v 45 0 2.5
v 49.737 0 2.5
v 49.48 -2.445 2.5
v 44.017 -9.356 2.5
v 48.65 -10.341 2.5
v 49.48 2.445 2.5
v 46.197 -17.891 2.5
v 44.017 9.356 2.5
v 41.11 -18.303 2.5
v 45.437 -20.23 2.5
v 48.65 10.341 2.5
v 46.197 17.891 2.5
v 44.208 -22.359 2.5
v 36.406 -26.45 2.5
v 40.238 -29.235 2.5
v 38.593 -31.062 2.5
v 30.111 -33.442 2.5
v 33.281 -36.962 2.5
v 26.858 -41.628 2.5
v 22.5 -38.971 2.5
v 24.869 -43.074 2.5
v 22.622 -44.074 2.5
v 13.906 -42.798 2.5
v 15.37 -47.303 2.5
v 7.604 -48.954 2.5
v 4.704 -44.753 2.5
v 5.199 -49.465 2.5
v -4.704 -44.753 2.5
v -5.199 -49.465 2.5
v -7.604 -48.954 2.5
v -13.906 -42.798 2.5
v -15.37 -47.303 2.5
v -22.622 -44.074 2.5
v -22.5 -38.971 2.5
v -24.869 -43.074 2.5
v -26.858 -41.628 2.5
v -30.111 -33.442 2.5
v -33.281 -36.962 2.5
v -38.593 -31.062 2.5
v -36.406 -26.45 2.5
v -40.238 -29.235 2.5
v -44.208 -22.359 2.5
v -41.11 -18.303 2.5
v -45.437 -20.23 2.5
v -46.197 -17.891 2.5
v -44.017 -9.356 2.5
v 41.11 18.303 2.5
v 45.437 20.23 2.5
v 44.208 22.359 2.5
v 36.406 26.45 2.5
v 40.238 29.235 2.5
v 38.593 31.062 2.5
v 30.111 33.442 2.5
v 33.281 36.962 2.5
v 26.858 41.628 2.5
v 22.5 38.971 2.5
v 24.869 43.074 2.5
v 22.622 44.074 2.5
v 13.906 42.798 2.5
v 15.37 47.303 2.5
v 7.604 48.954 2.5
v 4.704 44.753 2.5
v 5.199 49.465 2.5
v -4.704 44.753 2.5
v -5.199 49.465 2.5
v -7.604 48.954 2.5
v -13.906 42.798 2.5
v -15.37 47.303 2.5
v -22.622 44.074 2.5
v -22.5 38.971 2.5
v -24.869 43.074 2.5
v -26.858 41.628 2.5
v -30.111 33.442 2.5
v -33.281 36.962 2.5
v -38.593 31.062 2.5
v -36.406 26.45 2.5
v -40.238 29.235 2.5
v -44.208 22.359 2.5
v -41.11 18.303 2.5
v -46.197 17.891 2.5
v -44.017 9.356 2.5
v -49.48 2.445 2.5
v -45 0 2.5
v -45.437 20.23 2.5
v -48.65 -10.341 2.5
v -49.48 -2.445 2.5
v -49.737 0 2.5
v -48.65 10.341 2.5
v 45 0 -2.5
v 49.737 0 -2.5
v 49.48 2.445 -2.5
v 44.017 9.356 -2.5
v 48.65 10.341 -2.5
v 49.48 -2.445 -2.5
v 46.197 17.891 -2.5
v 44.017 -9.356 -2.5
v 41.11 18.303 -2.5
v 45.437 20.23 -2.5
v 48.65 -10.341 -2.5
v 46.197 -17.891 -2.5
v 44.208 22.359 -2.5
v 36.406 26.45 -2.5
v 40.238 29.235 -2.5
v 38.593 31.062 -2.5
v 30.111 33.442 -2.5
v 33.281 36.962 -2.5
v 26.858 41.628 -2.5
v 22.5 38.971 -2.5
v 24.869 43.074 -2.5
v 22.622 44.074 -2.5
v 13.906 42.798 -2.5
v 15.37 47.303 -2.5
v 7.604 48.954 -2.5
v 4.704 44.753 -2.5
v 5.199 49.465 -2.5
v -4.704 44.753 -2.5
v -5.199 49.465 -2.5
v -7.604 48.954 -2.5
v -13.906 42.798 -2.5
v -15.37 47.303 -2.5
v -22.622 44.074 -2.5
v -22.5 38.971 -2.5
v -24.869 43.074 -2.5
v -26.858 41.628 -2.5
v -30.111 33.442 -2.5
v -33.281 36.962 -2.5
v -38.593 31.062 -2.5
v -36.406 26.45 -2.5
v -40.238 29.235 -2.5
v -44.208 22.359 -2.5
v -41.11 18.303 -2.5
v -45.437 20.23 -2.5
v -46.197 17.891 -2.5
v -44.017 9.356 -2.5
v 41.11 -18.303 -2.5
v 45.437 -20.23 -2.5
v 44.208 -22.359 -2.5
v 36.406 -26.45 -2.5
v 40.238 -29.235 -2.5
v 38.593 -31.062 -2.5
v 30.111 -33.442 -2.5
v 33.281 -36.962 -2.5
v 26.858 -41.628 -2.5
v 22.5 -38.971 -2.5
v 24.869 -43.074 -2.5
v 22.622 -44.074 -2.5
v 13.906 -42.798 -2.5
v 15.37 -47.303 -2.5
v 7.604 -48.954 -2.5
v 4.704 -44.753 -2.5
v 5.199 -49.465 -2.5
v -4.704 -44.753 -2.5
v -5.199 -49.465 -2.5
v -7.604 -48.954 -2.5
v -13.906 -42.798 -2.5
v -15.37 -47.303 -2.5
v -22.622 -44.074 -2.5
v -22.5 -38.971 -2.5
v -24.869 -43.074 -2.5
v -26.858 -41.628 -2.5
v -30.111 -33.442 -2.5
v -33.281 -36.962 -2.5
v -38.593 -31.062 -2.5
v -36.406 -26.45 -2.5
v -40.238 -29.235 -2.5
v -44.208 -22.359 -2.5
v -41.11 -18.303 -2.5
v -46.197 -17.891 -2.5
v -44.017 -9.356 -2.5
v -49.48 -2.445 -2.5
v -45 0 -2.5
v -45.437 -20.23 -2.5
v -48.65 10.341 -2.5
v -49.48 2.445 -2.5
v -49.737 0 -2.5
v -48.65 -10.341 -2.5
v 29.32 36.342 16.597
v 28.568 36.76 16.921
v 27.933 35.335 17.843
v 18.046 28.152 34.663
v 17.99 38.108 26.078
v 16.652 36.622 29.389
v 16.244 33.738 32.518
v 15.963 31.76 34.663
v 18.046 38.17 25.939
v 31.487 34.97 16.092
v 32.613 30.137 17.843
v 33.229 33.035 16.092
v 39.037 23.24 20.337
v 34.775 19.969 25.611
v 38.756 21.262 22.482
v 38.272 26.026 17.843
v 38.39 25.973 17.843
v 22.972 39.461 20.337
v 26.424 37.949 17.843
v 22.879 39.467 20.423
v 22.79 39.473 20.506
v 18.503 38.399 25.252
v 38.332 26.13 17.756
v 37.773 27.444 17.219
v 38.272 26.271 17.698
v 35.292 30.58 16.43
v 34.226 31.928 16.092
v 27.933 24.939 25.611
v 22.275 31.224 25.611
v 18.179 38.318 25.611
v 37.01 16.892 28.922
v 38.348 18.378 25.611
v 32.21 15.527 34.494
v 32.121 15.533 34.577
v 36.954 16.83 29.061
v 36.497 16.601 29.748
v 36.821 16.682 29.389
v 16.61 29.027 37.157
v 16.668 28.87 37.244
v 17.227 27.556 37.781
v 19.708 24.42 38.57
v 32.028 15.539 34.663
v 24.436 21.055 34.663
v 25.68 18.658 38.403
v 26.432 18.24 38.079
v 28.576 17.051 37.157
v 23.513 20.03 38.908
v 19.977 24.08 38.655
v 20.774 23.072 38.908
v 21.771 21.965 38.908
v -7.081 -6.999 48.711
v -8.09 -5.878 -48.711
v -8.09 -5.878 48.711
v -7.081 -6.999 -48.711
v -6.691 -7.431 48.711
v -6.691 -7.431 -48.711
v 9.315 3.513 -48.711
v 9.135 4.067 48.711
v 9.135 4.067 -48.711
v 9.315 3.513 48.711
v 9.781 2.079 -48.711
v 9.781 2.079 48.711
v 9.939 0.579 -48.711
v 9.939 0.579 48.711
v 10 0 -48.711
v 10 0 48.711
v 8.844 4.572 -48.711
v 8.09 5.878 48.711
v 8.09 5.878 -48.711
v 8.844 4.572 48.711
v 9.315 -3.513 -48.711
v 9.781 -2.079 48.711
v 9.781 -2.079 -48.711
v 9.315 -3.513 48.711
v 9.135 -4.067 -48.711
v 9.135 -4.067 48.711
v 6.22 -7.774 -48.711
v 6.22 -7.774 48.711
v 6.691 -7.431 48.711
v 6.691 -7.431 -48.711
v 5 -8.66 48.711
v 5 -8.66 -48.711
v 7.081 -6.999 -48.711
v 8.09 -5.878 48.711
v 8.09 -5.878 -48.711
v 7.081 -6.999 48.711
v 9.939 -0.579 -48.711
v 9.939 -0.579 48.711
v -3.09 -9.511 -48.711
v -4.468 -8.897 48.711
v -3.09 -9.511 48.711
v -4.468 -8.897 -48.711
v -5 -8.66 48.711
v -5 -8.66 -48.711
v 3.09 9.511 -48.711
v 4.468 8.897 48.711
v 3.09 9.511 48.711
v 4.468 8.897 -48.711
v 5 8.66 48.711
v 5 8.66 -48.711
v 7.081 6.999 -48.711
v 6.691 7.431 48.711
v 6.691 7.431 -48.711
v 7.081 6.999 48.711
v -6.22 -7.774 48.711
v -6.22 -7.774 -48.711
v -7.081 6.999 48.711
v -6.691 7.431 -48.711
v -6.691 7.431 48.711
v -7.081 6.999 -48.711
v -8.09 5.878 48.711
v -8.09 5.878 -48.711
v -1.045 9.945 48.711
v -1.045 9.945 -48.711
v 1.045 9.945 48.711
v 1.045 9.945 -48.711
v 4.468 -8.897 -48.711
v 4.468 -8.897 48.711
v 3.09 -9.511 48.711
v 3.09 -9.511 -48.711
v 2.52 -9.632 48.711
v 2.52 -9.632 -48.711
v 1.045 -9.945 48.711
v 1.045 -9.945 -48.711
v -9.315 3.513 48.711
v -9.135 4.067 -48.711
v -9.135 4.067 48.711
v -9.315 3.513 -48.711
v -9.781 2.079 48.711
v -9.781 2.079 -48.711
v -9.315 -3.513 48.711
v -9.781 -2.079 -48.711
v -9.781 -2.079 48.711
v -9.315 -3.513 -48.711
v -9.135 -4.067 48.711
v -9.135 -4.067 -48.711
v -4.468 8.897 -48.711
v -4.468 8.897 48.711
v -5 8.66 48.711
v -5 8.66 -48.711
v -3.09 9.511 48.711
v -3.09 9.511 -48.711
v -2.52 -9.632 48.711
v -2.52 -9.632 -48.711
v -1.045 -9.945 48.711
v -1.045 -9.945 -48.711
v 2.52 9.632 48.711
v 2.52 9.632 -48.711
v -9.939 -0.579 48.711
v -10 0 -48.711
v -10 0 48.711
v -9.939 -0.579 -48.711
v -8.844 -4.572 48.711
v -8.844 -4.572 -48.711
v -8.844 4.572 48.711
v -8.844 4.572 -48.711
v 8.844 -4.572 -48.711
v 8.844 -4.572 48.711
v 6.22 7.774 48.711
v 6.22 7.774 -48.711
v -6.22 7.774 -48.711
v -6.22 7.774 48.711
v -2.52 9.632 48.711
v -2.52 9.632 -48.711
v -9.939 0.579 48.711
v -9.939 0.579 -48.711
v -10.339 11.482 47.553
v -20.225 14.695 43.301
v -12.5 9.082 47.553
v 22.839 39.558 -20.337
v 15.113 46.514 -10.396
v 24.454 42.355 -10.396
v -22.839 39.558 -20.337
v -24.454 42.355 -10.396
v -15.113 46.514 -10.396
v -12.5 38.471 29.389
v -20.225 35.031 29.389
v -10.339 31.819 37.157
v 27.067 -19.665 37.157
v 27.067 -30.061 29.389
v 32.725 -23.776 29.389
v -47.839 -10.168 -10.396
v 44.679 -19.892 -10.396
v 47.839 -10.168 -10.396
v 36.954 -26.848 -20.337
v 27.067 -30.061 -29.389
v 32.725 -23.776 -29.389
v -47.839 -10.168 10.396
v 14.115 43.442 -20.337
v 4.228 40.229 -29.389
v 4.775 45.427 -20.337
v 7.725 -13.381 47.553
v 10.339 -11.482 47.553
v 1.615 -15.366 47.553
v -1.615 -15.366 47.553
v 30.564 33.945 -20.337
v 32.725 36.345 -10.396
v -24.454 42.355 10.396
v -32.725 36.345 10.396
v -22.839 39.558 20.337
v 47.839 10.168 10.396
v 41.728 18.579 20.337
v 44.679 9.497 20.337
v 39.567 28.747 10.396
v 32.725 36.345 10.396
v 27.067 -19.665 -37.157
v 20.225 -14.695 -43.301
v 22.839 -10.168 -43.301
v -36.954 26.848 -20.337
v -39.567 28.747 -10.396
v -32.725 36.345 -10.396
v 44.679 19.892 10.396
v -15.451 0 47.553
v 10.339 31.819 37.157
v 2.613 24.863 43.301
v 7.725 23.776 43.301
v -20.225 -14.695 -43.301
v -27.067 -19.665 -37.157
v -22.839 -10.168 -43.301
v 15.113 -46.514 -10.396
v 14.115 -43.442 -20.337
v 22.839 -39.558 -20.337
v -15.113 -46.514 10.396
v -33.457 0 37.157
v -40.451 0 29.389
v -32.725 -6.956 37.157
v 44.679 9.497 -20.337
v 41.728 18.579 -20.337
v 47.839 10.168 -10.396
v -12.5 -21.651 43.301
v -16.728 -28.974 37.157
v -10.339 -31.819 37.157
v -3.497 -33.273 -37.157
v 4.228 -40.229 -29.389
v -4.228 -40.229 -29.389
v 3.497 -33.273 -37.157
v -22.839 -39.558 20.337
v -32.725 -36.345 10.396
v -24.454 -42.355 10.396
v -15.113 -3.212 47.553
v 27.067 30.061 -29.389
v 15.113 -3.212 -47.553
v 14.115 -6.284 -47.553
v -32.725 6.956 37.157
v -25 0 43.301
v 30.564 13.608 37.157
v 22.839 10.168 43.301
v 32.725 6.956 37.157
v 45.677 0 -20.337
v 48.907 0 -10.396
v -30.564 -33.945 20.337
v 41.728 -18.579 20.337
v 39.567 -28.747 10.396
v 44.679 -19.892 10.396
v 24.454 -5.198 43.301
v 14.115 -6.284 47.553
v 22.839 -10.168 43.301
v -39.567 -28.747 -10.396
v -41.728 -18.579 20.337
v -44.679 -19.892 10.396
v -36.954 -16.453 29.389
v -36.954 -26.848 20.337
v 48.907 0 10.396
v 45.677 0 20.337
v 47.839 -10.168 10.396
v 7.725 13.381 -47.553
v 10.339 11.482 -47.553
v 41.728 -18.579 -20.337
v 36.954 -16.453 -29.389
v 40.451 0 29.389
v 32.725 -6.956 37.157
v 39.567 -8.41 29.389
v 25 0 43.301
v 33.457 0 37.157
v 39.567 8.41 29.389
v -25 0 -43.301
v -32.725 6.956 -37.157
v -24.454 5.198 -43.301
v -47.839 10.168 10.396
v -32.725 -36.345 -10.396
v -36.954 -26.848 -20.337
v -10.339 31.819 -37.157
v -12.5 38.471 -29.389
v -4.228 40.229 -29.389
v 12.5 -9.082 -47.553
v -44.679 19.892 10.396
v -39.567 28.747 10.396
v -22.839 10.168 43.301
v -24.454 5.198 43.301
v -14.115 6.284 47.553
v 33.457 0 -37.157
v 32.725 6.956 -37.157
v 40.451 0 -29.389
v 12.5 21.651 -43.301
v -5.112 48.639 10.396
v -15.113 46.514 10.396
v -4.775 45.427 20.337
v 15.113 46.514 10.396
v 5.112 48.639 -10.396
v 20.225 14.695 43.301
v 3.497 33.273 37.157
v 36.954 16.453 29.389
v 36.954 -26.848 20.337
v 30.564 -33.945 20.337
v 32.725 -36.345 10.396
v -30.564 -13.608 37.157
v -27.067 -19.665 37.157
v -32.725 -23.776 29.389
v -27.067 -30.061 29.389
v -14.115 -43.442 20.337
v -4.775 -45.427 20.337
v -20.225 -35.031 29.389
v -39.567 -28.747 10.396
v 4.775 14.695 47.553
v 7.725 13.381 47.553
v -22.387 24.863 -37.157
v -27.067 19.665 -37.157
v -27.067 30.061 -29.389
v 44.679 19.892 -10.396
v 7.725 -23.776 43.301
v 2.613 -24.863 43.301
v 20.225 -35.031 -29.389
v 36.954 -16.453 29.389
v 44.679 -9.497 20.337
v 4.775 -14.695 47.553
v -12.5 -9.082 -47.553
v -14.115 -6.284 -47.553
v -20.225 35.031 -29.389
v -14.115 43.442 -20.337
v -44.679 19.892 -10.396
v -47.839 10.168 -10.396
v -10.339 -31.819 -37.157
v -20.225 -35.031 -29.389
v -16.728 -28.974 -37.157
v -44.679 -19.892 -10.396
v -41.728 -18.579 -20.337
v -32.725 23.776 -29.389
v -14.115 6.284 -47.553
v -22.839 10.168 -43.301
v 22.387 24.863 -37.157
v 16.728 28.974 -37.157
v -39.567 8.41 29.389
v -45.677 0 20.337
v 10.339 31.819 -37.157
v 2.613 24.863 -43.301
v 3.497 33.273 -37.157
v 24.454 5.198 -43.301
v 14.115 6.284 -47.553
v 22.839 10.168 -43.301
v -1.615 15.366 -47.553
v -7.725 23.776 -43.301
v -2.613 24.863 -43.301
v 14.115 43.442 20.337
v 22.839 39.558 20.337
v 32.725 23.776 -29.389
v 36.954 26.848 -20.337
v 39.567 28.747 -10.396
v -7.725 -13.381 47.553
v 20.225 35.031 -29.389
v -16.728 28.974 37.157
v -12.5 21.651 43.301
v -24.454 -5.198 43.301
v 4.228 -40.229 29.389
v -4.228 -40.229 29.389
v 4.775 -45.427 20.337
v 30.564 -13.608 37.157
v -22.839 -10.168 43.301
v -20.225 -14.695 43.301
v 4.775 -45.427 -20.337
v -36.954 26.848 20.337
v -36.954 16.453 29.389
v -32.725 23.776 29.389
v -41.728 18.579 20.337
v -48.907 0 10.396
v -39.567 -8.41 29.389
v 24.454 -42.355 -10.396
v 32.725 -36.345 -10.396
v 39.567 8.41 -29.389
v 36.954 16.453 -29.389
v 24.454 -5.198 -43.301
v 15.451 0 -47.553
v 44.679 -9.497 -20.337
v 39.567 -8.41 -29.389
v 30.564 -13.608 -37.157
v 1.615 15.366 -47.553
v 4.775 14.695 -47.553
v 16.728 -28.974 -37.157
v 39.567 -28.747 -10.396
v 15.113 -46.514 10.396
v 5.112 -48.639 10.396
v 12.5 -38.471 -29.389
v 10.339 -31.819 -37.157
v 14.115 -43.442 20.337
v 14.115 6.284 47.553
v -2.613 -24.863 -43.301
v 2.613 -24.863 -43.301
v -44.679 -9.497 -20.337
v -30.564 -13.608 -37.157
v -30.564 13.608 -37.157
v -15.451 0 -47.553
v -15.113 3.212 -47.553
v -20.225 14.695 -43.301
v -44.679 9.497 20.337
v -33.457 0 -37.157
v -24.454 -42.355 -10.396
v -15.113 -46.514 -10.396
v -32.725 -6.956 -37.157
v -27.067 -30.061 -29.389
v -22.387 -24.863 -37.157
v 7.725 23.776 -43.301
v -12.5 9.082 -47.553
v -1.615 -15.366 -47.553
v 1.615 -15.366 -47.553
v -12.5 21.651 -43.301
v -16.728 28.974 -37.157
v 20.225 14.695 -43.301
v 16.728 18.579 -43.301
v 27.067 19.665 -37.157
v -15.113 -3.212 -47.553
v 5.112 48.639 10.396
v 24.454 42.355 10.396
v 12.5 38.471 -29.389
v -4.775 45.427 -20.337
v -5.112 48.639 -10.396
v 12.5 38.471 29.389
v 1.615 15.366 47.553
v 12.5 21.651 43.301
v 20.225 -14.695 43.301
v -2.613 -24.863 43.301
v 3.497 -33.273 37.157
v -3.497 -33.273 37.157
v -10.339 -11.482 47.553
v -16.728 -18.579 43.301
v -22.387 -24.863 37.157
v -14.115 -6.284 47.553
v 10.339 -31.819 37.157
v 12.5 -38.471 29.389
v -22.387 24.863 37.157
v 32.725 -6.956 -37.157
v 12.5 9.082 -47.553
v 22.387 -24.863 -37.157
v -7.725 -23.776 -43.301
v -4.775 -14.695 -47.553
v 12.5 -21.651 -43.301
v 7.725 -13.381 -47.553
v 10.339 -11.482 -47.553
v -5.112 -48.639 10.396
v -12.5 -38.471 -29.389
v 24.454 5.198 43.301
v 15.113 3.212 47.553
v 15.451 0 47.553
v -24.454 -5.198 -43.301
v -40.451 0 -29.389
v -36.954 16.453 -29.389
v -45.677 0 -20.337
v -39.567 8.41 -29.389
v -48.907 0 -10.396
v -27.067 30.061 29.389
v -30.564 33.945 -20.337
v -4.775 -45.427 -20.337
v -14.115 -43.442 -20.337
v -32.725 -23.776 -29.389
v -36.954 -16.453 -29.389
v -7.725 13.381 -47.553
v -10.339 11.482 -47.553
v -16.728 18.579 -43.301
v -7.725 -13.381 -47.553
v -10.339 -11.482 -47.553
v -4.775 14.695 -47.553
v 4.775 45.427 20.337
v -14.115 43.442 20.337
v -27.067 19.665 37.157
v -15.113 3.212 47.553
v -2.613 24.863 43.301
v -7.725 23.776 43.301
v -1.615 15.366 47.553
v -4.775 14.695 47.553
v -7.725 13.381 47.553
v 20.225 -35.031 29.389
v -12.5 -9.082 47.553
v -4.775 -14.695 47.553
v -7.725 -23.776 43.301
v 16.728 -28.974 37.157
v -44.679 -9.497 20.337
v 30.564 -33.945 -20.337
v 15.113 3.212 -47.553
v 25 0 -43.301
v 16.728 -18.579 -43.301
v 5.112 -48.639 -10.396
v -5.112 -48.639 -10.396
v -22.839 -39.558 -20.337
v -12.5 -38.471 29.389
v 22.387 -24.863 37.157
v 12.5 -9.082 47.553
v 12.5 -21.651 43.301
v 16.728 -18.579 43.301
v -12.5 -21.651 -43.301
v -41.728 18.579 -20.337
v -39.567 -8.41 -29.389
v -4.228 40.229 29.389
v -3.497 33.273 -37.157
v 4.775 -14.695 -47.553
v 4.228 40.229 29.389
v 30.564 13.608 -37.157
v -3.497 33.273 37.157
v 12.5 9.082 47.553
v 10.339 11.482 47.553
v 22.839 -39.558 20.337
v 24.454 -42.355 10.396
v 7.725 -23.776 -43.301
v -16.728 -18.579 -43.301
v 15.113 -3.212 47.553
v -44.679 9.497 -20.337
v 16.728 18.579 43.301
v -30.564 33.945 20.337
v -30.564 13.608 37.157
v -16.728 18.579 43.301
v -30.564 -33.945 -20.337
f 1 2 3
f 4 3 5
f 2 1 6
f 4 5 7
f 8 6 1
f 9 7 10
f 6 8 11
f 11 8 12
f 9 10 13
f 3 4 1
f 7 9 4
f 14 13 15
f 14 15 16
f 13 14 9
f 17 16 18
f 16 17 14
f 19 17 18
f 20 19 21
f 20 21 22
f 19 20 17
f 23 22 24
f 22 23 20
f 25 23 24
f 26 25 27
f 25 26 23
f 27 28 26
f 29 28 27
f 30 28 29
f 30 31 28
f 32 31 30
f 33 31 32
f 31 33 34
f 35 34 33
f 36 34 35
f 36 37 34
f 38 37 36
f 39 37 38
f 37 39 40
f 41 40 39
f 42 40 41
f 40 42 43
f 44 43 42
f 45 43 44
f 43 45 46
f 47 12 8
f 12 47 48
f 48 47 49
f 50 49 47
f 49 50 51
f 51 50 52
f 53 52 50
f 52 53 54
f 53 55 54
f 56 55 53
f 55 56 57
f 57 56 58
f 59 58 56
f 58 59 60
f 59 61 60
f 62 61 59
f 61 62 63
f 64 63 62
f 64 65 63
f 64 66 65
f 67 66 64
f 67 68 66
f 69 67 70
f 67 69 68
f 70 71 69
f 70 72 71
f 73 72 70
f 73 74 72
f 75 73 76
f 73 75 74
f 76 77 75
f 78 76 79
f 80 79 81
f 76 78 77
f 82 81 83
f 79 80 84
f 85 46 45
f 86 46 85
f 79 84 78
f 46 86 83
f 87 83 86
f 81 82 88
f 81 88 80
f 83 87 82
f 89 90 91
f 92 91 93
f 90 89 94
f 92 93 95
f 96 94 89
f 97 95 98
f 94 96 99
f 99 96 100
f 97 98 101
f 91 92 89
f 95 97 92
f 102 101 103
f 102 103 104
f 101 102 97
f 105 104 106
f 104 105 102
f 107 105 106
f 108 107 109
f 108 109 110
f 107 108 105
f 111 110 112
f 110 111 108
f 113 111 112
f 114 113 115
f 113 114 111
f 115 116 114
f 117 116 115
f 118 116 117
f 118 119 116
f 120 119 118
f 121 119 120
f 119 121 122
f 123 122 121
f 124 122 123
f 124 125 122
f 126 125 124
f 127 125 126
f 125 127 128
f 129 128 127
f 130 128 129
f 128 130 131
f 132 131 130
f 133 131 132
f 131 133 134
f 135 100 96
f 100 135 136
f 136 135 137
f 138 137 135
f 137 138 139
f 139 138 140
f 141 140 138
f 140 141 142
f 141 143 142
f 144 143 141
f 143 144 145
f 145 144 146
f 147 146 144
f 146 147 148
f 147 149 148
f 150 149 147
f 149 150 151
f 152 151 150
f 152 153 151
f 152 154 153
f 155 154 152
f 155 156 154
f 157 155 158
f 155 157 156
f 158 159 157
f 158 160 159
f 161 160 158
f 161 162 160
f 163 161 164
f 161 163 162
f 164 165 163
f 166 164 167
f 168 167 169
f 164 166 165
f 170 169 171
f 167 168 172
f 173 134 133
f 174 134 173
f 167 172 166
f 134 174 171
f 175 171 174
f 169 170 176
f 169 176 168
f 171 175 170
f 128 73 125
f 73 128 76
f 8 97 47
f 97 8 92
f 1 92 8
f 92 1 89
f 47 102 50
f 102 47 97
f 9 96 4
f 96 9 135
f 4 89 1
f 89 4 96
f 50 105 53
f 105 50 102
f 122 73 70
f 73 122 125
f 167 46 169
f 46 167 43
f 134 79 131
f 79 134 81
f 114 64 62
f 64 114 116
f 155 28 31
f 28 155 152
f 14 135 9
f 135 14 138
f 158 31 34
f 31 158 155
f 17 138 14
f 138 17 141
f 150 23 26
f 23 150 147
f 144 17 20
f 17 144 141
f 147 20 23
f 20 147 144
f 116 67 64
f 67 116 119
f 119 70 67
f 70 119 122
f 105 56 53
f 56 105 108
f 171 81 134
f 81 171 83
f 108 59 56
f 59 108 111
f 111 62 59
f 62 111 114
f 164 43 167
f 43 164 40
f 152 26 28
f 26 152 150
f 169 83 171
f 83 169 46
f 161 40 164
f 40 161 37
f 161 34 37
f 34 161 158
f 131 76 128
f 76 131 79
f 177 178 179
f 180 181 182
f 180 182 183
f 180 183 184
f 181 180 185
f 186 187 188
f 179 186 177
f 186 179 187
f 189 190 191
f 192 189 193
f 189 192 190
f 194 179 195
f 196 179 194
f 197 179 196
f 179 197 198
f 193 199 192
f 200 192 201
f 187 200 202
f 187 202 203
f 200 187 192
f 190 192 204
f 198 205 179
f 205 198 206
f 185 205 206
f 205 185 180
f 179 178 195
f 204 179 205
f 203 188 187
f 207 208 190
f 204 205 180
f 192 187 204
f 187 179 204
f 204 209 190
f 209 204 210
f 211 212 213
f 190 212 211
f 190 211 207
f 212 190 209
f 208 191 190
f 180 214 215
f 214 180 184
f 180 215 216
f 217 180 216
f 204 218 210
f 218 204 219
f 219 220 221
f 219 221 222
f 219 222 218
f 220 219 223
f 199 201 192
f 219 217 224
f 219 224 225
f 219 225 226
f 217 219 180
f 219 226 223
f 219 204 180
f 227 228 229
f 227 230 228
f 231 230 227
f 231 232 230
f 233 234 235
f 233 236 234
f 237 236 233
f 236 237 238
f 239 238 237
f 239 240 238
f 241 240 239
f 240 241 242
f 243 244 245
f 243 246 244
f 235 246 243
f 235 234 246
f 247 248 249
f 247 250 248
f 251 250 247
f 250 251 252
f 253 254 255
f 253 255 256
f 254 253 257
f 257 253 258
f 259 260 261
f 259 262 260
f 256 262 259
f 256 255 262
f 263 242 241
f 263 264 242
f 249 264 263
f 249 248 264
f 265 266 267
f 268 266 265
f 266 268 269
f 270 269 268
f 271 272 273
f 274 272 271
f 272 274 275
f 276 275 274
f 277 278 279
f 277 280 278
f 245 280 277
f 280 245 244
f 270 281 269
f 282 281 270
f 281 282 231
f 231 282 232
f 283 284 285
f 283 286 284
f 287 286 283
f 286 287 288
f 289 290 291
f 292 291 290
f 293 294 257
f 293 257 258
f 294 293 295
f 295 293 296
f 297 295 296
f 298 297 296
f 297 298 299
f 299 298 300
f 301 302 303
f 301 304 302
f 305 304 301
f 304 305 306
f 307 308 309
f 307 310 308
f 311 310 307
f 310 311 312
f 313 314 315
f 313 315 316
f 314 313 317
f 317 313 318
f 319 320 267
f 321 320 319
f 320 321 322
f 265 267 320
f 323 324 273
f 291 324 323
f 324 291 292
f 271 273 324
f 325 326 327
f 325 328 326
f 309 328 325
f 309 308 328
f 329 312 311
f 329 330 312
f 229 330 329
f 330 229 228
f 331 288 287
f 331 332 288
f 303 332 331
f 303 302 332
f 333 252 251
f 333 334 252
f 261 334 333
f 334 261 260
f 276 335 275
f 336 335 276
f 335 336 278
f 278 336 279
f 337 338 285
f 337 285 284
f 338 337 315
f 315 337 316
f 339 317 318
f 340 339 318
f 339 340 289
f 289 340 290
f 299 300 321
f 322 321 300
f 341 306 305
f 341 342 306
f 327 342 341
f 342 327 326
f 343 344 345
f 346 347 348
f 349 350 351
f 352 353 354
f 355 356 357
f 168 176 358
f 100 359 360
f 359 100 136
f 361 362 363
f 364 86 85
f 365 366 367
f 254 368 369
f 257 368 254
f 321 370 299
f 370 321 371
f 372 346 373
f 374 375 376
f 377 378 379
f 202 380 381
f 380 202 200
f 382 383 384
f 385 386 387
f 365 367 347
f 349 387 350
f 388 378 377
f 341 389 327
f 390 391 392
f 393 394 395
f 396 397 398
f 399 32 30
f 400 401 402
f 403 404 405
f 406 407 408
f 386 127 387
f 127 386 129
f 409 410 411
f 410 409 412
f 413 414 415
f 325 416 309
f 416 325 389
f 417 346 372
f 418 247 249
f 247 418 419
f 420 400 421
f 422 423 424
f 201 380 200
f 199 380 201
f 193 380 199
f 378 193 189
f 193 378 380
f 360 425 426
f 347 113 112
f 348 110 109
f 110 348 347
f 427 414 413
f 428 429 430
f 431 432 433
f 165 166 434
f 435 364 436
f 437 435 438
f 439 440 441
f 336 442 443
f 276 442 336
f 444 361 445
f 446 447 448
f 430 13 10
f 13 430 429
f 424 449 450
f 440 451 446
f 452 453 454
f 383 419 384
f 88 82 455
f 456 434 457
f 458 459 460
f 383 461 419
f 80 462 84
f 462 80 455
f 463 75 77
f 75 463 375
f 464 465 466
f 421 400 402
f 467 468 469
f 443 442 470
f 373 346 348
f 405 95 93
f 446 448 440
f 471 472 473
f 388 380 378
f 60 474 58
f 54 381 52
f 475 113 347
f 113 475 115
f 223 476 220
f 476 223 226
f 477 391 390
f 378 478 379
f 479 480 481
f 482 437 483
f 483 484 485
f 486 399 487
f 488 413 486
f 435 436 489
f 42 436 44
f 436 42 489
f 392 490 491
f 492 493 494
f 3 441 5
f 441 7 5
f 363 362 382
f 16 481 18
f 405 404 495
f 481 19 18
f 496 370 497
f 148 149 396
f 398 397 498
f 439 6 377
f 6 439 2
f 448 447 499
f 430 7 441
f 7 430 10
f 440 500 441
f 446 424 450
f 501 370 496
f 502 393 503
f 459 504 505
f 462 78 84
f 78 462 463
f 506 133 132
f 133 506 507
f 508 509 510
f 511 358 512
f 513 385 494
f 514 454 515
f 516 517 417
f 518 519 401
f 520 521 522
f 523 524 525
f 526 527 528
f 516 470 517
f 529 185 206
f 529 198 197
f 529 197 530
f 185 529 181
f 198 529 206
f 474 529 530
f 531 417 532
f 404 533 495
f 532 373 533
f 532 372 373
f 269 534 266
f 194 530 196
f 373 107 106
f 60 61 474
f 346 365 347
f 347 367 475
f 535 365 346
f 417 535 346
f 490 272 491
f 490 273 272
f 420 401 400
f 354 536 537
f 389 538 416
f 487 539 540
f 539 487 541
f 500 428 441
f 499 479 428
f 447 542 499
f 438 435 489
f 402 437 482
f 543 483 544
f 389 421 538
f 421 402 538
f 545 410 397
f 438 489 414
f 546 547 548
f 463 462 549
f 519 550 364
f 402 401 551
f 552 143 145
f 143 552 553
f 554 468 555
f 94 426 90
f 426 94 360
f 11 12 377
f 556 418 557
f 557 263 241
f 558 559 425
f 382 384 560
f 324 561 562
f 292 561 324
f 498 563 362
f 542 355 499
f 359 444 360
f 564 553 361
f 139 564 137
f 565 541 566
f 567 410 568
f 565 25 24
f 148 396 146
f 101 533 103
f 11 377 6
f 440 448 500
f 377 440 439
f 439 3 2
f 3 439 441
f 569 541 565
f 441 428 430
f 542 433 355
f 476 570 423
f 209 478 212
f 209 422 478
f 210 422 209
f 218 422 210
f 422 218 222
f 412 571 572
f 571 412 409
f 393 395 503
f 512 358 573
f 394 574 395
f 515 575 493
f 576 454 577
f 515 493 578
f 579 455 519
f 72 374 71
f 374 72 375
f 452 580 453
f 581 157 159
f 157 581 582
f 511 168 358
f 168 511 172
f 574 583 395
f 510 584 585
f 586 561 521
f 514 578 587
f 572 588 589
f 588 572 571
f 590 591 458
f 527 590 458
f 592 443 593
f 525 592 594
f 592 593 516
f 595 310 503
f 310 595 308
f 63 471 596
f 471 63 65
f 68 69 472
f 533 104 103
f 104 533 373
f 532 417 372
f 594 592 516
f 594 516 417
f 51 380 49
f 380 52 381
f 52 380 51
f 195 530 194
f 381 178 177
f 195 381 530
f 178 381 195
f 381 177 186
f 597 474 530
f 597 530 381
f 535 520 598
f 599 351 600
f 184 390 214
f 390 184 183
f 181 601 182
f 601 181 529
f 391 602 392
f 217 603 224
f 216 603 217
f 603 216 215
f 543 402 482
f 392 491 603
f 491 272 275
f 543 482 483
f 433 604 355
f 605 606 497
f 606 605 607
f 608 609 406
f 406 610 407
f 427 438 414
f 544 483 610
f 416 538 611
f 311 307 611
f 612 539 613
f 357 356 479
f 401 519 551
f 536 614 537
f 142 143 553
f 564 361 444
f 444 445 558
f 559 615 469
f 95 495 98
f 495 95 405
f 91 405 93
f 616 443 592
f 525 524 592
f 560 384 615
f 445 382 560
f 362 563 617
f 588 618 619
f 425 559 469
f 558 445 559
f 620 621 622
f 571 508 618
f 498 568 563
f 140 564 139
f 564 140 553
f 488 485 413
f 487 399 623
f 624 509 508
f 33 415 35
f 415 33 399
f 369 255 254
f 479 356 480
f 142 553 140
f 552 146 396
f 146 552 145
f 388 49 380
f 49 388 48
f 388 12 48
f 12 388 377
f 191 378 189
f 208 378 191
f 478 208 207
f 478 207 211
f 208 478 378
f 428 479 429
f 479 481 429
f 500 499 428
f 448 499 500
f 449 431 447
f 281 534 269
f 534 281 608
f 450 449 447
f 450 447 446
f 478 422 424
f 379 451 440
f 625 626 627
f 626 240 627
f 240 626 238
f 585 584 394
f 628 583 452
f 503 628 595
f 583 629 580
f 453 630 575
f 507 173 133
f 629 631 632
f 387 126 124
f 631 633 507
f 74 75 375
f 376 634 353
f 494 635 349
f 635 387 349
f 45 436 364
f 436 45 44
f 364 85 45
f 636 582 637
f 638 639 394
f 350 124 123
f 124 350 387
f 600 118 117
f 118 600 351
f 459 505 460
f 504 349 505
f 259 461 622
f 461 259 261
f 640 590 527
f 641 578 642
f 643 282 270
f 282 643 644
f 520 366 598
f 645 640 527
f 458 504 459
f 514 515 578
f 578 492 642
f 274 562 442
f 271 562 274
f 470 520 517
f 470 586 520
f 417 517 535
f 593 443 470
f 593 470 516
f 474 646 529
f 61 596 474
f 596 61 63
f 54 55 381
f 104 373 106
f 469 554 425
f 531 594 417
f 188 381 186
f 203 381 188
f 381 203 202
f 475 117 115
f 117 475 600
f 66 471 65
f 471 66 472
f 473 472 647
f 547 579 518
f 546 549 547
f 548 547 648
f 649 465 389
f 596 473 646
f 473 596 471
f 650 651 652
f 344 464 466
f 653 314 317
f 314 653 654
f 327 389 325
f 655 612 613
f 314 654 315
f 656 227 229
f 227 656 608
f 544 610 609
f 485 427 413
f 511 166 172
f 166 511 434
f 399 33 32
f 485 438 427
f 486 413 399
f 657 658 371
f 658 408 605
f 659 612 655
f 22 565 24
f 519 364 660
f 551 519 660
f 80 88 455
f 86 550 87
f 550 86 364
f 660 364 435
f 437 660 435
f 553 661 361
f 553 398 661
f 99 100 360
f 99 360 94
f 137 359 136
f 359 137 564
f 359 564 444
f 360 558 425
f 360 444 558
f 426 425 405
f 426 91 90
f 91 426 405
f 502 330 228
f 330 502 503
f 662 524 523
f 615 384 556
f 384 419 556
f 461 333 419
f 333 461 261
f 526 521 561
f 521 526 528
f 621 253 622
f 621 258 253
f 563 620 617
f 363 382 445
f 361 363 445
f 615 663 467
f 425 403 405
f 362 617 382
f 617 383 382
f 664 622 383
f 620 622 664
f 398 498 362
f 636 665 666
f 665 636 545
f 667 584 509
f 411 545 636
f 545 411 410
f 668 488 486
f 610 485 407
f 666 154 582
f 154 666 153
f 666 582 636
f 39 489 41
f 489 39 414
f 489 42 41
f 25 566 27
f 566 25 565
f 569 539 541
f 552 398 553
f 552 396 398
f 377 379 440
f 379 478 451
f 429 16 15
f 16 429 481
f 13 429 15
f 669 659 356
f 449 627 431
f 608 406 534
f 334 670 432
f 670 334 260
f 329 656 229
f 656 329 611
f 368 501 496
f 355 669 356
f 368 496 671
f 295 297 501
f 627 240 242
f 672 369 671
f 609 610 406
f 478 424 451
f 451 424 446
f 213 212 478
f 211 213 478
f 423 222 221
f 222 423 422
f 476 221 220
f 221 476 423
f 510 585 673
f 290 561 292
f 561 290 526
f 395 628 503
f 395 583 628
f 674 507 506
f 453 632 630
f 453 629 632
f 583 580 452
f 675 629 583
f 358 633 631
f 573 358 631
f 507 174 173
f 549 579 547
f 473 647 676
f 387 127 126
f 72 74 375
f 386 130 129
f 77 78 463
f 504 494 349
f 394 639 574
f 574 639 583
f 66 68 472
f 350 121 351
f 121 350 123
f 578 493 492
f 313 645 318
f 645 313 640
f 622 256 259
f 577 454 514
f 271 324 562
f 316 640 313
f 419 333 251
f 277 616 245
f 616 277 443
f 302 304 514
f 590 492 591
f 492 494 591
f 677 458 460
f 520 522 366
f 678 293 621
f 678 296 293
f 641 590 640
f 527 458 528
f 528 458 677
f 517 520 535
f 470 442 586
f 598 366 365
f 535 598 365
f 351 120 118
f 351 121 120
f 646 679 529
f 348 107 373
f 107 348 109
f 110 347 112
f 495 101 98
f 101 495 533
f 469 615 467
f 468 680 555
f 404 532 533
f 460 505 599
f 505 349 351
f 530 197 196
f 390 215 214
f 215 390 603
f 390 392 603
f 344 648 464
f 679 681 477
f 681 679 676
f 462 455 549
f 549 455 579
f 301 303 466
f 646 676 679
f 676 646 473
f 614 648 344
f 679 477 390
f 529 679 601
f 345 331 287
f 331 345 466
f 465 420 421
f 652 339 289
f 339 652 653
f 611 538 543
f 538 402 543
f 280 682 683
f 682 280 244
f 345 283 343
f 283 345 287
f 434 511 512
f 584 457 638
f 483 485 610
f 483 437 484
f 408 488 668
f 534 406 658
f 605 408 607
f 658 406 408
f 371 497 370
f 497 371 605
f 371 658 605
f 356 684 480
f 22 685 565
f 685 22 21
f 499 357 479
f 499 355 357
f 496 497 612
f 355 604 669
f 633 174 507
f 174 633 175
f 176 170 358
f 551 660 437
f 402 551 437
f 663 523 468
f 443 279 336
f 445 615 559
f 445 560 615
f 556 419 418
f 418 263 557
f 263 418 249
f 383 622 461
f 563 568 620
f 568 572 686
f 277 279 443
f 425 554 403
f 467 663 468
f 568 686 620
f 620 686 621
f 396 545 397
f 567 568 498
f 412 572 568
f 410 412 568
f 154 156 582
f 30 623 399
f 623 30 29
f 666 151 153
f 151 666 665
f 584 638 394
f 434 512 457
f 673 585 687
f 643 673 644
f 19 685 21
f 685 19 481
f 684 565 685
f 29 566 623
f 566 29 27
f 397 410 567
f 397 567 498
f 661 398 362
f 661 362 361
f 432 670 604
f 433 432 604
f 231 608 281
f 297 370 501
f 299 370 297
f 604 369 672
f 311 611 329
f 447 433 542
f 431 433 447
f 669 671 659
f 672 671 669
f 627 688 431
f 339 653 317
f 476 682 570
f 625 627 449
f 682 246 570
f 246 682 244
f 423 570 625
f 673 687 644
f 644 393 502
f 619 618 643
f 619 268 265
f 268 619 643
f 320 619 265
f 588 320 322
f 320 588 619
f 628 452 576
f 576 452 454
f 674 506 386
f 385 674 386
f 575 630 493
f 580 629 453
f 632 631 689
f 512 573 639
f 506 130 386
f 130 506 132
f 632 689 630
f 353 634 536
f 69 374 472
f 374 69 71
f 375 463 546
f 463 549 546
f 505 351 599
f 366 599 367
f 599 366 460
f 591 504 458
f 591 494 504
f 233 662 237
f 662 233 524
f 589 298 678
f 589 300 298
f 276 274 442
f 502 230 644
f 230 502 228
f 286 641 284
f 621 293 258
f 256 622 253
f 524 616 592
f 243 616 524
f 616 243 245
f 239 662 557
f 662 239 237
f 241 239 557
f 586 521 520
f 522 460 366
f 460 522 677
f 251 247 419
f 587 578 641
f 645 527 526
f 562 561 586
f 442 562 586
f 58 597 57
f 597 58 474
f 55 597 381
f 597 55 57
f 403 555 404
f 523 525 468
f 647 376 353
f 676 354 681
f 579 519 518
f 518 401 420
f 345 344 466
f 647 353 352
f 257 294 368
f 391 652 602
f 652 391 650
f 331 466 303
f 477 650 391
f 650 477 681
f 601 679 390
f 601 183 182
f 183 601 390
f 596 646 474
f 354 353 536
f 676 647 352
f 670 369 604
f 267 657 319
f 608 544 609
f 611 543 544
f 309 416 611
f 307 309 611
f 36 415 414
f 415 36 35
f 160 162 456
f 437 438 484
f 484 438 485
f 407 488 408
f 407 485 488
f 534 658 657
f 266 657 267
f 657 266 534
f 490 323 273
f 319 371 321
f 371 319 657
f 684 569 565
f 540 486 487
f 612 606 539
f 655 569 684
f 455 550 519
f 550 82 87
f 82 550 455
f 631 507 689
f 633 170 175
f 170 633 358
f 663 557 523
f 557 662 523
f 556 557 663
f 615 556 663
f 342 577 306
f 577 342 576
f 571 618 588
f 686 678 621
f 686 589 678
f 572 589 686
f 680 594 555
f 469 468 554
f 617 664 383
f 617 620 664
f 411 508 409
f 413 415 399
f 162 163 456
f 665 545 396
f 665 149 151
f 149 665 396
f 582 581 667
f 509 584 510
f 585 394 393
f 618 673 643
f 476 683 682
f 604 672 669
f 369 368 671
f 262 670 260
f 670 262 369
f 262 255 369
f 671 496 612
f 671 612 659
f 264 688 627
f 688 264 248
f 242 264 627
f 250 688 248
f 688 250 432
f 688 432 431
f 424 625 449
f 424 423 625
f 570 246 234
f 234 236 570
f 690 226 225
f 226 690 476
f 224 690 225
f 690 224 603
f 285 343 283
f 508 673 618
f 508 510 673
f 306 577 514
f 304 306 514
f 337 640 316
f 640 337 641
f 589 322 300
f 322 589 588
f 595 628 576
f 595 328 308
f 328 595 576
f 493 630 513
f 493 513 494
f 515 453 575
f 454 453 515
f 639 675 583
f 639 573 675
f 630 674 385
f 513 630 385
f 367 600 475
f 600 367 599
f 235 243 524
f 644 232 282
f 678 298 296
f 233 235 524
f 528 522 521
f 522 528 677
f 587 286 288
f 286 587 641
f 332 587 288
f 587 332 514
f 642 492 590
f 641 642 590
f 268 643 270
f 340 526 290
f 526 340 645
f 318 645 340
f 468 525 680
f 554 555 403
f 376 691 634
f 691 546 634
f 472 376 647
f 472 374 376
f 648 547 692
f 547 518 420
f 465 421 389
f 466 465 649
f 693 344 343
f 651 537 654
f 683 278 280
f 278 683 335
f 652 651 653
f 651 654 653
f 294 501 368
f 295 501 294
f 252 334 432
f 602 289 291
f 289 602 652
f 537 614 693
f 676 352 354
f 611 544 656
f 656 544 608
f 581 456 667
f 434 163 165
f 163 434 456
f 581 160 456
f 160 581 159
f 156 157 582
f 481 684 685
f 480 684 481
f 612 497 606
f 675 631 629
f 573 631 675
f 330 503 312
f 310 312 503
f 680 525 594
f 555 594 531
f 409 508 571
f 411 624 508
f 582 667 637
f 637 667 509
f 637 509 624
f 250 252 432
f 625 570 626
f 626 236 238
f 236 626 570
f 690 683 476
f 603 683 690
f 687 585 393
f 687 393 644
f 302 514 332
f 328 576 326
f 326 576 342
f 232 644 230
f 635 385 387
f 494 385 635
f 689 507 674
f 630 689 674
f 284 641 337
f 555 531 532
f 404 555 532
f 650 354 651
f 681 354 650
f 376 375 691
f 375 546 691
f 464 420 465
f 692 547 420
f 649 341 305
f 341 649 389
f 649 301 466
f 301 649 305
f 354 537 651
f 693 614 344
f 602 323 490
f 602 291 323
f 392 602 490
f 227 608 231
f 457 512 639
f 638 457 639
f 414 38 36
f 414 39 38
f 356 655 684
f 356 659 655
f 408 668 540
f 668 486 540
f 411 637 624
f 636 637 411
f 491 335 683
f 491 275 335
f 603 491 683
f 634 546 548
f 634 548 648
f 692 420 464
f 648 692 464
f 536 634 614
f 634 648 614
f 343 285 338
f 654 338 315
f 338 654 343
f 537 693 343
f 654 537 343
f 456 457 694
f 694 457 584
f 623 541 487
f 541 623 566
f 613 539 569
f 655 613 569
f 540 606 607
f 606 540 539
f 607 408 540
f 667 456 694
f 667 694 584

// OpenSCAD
//these are examples for the composites

module myCuttingTool(distance=5,trenchThickness=5){
	translate([distance,distance,distance]){
		sphere(50);
	}
	#cylinder(100,10,10,true);
	difference(){
		cylinder(trenchThickness,55,55,true);
		cylinder(trenchThickness,45,45,true);
	}
}


module myExample(){

	difference(){
		sphere(50);
		myCuttingTool(distance=55,trenchThickness=5);
	}
}

myExample();
